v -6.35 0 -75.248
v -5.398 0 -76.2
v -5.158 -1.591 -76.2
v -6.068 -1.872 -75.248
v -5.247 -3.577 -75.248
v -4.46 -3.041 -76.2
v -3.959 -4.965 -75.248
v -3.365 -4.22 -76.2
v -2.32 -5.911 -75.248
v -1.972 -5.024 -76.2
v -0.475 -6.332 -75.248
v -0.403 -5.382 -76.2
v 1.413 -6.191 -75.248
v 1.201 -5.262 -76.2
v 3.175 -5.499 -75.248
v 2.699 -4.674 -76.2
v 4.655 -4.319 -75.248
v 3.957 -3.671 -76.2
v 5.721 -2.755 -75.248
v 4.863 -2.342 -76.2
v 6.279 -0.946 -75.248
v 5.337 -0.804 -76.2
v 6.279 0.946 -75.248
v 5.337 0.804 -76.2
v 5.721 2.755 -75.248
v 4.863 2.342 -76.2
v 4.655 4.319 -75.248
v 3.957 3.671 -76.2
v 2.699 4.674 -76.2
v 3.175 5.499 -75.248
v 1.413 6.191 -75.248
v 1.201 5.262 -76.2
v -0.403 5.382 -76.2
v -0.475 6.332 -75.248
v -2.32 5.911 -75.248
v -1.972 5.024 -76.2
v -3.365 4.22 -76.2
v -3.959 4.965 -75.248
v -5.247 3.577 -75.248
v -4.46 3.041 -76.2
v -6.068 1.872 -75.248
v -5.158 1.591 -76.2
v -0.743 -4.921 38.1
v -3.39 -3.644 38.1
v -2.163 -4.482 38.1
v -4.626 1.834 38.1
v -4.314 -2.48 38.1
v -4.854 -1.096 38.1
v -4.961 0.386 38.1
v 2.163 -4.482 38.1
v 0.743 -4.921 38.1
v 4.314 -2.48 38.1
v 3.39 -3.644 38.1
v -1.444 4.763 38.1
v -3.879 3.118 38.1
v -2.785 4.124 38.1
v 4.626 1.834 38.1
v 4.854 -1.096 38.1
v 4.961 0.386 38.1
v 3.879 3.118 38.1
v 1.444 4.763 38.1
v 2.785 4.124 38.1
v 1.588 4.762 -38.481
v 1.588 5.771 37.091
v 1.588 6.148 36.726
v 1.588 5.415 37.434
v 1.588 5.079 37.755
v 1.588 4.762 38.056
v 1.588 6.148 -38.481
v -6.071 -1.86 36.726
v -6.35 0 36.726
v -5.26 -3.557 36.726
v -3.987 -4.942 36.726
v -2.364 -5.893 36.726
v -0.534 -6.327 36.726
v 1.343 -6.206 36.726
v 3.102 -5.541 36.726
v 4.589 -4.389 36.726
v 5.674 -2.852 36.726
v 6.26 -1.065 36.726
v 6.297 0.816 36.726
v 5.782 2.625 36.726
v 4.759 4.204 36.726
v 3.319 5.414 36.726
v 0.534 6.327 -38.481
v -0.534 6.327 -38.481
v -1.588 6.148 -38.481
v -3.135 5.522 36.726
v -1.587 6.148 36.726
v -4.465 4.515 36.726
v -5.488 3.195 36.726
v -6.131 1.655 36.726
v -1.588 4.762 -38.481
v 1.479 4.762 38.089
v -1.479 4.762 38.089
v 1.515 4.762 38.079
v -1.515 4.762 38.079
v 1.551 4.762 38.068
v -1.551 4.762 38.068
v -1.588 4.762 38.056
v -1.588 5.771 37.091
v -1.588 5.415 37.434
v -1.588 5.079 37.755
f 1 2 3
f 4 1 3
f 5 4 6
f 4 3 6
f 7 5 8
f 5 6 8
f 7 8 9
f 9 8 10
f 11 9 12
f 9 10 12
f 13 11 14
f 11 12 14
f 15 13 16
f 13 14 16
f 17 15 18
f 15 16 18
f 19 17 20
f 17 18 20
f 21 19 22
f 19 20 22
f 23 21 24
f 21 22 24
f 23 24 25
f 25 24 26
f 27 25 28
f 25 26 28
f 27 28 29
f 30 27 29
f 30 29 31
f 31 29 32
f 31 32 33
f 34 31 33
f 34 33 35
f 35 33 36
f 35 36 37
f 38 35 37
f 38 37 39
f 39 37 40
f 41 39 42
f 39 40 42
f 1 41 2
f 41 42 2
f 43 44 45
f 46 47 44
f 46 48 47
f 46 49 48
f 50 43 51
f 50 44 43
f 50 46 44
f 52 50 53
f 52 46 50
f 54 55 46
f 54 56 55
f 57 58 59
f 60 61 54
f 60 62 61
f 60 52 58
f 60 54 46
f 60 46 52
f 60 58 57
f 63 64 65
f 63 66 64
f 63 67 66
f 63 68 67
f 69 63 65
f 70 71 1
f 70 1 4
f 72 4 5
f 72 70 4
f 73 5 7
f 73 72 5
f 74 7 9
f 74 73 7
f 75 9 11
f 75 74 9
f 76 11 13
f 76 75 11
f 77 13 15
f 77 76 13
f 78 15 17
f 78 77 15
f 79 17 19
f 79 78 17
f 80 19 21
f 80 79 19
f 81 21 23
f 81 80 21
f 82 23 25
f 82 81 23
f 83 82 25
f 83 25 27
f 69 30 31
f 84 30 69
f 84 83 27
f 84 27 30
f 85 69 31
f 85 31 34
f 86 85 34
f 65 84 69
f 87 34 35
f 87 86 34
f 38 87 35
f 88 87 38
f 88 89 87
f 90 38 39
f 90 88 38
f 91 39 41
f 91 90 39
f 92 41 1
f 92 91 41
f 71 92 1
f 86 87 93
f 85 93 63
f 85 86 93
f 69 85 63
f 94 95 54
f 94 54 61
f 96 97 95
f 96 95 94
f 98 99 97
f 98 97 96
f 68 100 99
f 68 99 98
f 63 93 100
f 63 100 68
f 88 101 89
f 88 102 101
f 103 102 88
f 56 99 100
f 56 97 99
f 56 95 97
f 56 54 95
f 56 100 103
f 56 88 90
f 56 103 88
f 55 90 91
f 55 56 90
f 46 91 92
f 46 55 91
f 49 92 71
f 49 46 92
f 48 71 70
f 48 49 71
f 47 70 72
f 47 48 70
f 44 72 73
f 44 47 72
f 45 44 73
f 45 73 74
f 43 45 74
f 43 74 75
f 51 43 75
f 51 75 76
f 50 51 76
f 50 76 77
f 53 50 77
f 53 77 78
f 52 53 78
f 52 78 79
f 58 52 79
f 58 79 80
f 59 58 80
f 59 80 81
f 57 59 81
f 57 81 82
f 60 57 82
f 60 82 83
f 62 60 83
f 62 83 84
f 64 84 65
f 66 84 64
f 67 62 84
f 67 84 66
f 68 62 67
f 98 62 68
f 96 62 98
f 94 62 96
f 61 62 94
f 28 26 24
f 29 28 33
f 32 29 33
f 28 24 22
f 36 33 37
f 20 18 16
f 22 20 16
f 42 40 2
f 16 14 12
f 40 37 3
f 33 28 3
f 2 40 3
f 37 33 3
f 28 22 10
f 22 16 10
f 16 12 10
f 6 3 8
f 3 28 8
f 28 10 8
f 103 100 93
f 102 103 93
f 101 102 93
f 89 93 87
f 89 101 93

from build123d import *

# Parameters (mm, degrees)
SKETCH1_R           = 6.35
EXTRUDE1_DEPTH      = 76.2
CHAMFER1_SIZE       = 0.9525
SKETCH3_W           = 3.175
SKETCH3_H           = 1.5875
EXTRUDE2_DEPTH      = 77.727341932
EXTRUDE2_DEPTH_BACK = 38.481
CHAMFER2_SIZE       = 1.373522526


with BuildPart() as part:
    # Sketch1 → Extrude1 (new, symmetric)
    with BuildSketch(Plane.XY):
        with Locations(Location((0, 0, 0), (0, 0, 180))):
            Circle(SKETCH1_R)
    extrude(amount=EXTRUDE1_DEPTH, both=True)

    # Chamfer1
    chamfer1_edges = [part.edges().sort_by_distance(p)[0] for p in [
        (6.35, 0, -76.2),
        (6.35, 0, 76.2),
    ]]
    chamfer(chamfer1_edges, length=CHAMFER1_SIZE)

    # Sketch3 → Extrude2 (cut, two sides)
    with BuildSketch(Plane.XY) as extrude2_sk:
        with Locations((0, 5.55625)):
            Rectangle(SKETCH3_W, SKETCH3_H)
    extrude(amount=EXTRUDE2_DEPTH, mode=Mode.SUBTRACT)
    extrude(extrude2_sk.sketch, amount=-EXTRUDE2_DEPTH_BACK, mode=Mode.SUBTRACT)

    # SurfaceCut1
    split(bisect_by=Plane.XY.offset(38.1), keep=Keep.BOTTOM)

    # Chamfer2
    chamfer2_edges = [part.edges().sort_by_distance(p)[0] for p in [
        (3.888564967, -5.020115786, 38.1),
    ]]
    chamfer(chamfer2_edges, length=CHAMFER2_SIZE)


solid = part.part
